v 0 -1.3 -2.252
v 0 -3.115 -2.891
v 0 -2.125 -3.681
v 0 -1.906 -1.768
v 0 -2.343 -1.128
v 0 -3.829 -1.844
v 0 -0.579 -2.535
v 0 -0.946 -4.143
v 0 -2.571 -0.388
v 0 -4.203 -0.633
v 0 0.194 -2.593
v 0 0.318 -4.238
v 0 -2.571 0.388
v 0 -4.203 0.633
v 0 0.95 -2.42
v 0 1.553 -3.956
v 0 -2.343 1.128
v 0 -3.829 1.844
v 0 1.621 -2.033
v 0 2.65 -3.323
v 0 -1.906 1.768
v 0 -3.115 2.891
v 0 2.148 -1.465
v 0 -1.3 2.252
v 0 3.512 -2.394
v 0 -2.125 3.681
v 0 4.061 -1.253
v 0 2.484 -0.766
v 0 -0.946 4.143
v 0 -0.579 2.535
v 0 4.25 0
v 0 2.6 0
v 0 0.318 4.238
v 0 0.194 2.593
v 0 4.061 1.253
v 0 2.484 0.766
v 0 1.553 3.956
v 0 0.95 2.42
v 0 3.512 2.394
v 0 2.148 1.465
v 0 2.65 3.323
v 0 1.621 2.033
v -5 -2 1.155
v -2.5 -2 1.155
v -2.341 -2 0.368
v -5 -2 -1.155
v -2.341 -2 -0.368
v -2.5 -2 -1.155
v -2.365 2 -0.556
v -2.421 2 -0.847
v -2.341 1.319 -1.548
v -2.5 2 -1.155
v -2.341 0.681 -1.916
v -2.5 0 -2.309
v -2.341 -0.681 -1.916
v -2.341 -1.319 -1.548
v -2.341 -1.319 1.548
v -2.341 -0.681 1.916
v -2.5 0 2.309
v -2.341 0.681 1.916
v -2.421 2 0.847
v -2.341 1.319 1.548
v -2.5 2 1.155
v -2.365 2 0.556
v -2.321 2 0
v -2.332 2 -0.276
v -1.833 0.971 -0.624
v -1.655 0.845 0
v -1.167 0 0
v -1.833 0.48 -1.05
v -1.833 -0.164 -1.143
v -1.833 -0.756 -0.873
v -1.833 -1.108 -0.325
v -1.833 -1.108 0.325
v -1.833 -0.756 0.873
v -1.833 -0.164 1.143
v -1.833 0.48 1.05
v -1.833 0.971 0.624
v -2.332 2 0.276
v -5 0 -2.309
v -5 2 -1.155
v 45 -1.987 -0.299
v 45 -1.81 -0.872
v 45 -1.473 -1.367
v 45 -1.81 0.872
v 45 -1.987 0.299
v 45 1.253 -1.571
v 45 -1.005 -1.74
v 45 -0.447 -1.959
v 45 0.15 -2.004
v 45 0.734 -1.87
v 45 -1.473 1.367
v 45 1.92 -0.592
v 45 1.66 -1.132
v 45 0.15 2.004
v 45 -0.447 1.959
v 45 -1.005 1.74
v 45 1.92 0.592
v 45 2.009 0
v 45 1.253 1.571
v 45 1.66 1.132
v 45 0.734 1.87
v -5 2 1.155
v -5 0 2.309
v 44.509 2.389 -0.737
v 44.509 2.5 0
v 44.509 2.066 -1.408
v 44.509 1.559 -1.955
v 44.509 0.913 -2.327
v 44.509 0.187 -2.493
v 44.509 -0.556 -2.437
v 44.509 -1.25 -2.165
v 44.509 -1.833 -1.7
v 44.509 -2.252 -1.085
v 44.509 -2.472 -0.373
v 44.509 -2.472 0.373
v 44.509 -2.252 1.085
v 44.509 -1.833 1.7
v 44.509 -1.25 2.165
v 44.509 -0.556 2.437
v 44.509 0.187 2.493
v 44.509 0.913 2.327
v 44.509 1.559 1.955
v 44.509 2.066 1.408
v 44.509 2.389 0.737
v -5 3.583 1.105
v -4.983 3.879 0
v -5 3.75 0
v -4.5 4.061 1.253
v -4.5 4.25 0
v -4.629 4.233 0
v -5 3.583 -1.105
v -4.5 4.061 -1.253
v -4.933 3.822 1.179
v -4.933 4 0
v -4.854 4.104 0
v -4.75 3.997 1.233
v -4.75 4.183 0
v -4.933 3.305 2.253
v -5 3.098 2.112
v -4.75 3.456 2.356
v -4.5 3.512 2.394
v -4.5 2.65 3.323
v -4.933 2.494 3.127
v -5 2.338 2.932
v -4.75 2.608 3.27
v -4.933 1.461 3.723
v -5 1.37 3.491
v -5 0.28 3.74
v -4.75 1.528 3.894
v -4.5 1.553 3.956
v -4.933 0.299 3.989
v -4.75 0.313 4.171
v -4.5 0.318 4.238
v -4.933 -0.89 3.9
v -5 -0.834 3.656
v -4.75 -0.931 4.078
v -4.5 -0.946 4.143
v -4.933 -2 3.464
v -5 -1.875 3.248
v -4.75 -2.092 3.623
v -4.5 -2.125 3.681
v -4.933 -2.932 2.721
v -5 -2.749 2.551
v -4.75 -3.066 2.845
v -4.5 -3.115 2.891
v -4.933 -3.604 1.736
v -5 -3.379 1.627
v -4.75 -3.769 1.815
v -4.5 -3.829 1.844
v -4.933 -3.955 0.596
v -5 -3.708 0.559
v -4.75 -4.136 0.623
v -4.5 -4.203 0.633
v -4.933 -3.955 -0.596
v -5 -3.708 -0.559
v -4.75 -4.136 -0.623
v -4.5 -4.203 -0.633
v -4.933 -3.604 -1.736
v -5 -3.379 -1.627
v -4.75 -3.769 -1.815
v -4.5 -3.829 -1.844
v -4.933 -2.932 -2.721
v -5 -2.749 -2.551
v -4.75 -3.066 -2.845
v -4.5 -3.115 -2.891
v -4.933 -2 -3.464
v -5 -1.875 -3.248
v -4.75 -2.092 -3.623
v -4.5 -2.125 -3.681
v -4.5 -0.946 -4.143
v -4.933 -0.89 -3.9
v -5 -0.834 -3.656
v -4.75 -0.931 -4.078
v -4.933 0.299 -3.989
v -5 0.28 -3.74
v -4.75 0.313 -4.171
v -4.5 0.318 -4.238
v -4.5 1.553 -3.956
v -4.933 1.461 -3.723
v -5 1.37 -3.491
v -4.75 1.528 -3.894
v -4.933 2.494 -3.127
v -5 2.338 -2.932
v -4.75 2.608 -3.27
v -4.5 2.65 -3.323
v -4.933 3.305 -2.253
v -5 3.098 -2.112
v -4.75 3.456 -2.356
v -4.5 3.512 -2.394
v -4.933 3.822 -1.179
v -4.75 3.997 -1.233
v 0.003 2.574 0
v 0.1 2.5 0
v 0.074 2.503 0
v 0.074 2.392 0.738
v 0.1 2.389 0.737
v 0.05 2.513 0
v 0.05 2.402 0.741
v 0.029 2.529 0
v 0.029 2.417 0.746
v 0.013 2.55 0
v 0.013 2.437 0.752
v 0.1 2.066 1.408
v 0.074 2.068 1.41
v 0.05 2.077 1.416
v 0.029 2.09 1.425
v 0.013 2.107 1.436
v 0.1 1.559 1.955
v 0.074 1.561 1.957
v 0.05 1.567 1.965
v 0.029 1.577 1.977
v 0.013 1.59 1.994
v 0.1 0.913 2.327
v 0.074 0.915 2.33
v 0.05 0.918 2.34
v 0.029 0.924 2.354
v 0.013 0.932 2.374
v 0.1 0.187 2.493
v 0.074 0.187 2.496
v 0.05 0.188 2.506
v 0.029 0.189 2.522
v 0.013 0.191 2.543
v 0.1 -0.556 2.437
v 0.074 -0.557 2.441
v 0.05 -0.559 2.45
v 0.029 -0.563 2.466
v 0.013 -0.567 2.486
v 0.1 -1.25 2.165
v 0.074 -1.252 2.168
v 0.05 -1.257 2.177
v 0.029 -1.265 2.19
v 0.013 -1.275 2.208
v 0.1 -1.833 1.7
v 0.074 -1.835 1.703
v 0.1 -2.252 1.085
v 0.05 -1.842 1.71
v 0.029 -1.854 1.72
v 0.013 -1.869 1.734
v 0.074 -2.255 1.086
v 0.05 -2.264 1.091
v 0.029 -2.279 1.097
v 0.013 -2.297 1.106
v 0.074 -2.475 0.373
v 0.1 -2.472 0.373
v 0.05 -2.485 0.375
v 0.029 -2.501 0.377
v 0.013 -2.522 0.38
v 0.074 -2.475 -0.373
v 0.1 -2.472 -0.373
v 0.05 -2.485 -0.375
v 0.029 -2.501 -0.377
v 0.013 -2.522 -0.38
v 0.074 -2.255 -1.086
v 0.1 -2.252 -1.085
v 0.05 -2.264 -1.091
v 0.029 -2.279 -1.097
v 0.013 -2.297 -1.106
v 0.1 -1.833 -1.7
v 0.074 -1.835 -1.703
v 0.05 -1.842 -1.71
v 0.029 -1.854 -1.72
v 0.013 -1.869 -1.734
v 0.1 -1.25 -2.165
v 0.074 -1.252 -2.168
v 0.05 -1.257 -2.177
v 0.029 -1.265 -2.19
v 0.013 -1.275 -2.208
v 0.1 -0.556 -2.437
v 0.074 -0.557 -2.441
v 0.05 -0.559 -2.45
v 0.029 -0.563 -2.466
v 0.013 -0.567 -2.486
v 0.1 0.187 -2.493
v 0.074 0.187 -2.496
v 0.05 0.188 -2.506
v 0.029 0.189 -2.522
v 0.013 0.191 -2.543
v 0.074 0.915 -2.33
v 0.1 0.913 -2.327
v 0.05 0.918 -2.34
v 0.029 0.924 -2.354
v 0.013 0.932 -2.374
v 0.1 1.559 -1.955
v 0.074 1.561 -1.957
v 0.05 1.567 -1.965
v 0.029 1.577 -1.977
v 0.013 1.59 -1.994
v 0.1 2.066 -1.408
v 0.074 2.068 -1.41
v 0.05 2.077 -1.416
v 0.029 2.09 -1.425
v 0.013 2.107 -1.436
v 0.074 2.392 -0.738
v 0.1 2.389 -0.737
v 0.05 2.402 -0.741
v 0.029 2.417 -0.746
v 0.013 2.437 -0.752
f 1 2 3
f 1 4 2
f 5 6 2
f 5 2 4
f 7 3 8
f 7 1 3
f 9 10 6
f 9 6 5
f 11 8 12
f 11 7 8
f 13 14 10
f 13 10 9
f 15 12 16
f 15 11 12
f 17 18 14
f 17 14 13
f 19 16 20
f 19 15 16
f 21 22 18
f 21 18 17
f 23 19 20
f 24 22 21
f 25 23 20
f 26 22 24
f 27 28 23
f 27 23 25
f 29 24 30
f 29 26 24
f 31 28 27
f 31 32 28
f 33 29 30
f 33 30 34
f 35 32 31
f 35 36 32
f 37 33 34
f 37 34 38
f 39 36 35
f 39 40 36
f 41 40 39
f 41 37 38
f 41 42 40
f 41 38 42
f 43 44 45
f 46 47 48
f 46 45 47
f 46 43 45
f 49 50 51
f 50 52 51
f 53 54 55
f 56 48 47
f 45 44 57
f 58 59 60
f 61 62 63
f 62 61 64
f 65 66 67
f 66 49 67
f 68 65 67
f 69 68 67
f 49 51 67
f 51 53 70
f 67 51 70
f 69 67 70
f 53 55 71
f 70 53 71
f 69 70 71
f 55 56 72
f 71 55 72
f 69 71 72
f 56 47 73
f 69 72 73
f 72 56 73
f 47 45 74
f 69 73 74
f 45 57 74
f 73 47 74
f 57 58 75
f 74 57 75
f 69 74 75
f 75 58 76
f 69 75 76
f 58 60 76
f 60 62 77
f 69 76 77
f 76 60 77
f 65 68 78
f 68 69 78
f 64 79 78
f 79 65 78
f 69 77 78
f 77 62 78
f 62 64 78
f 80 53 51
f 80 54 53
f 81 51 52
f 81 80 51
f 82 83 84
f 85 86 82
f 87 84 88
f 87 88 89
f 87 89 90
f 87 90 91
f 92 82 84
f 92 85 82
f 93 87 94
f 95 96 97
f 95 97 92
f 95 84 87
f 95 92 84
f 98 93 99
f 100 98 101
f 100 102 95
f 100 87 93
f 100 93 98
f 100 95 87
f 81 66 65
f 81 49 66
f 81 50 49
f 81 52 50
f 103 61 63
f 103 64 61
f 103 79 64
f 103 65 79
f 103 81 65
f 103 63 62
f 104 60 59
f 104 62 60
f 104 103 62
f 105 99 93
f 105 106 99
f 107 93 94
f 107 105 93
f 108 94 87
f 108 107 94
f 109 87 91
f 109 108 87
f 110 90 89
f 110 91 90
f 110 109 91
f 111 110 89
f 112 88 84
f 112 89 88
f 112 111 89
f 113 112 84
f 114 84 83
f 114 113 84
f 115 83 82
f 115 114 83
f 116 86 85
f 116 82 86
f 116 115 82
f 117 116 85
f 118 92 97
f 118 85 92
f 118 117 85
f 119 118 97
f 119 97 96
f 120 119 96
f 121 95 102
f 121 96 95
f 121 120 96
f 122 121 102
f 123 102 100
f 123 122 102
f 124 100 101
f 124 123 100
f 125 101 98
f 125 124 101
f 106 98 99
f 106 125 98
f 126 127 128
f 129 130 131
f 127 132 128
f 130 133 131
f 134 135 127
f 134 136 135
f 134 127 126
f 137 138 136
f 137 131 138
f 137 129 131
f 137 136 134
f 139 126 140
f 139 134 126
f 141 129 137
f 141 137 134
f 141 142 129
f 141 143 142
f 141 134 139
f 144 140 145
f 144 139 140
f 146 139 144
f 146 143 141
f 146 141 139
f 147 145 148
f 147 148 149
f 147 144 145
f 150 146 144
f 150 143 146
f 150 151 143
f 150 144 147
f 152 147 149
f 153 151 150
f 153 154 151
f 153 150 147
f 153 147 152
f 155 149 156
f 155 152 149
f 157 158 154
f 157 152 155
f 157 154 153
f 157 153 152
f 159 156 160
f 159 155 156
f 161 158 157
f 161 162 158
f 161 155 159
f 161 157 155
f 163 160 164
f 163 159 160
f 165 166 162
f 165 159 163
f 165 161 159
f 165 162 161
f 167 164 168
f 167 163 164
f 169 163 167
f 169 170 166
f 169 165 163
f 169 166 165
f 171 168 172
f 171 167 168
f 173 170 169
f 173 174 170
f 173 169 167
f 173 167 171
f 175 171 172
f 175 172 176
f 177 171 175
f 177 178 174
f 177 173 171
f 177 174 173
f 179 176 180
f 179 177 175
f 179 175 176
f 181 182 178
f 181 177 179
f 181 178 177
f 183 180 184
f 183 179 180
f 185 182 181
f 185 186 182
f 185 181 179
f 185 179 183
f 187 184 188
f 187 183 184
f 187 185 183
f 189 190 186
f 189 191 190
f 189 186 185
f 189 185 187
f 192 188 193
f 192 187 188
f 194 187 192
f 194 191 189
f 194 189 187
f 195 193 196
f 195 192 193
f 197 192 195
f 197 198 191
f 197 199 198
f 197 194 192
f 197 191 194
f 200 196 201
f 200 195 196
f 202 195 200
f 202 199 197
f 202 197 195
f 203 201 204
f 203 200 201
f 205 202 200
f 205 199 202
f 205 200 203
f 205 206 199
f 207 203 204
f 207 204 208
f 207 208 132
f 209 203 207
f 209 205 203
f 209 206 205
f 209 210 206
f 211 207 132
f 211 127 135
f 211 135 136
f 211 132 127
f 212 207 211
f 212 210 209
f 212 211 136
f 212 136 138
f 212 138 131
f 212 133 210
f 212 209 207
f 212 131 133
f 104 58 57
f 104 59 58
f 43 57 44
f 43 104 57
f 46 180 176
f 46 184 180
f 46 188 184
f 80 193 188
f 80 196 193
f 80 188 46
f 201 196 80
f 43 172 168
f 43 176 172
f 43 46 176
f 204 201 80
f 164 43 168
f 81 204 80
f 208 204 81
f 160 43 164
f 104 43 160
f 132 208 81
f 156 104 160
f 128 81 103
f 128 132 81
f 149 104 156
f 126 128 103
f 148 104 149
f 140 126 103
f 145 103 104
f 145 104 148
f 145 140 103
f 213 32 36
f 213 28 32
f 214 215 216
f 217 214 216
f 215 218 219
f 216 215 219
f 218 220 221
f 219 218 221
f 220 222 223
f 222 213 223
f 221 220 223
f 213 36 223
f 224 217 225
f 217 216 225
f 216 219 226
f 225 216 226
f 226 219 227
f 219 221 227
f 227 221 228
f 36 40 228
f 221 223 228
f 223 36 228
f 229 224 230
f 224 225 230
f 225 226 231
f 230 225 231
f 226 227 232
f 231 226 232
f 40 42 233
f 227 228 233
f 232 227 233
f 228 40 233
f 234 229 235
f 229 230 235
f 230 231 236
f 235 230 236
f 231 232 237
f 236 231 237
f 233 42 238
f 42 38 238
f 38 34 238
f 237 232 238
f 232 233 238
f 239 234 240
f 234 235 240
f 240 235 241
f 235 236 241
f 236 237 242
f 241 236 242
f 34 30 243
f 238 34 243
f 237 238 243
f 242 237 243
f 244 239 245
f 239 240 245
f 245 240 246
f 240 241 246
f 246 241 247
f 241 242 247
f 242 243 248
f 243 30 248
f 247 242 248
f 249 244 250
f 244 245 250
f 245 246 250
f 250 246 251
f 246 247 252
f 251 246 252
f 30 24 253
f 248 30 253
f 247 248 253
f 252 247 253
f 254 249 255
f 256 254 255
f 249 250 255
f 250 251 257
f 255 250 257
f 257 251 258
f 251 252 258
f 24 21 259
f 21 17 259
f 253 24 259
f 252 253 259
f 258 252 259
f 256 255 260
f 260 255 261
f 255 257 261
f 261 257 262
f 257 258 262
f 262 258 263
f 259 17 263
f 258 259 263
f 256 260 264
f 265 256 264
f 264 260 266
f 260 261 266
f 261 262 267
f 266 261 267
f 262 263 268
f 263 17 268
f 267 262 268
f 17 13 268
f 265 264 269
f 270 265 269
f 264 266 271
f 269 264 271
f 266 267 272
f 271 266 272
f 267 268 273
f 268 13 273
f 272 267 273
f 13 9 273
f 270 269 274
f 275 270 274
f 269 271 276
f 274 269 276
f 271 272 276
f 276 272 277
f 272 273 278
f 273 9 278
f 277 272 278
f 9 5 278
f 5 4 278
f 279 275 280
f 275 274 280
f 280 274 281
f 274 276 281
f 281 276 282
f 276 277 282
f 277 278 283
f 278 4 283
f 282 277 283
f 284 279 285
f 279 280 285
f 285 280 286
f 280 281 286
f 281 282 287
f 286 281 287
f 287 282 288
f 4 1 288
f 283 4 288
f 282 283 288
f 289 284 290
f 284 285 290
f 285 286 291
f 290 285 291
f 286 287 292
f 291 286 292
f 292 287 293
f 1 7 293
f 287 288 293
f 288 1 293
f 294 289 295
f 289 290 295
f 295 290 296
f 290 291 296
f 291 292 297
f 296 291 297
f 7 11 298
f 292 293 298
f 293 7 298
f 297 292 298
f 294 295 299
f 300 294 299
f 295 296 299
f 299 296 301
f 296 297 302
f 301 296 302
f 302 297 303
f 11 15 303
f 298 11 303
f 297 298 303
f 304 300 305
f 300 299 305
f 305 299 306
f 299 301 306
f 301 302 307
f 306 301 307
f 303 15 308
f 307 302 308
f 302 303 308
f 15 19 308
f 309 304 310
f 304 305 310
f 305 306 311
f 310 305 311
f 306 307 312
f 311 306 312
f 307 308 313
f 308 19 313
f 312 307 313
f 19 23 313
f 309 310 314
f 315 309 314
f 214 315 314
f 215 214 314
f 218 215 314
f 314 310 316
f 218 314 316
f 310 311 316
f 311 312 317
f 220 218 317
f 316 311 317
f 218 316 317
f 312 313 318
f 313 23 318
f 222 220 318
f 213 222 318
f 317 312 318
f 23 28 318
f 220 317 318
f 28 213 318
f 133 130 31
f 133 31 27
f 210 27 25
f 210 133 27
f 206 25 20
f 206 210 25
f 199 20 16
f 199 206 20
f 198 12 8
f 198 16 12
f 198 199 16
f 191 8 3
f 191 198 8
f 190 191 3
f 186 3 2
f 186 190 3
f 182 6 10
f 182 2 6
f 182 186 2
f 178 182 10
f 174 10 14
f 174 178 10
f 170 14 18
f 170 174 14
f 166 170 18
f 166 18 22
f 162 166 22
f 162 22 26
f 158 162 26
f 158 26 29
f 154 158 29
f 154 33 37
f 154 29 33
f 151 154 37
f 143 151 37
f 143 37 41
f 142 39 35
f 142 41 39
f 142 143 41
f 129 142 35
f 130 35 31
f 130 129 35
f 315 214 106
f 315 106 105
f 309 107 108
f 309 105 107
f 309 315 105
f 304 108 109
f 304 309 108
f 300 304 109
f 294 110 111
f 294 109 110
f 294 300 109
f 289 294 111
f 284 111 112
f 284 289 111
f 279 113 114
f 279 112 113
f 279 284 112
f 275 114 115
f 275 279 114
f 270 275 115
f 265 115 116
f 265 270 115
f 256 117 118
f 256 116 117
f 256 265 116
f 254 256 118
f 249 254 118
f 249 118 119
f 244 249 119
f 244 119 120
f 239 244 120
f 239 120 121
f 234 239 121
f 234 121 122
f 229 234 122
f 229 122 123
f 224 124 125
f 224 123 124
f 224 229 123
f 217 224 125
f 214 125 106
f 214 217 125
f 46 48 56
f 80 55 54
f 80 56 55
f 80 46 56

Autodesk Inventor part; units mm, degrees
ref_plane "YZ Plane" through (0, 0, 0) normal (1, 0, 0) x (0, 1, 0)
ref_plane "XZ Plane" through (0, 0, 0) normal (0, 1, 0) x (-1, 0, 0)
sketch "Sketch1" plane through (0, 0, 0) normal (0, 0, 1) x (1, 0, 0)
  line L0 (-1.1667, 0) -> (45, 0)
  line L1 (45, 0) -> (45, 2.5)
  line L2 (45, 2.5) -> (23, 2.5)
  line L3 (23, 2.5) -> (22.5091, 2.5)
  line L4 (22.5091, 2.5) -> (0, 2.5)
  line L5 (0, 2.5) -> (0, 4.25)
  line L6 (0, 4.25) -> (-5, 4.25)
  line L7 (-5, 4.25) -> (-5, 2.3094)
  line L8 (-5, 2.3094) -> (-2.5, 2.3094)
  line L9 (-2.5, 2.3094) -> (-1.1667, 0)
  line L10 (-15, 0) -> (55, 0) projected
  line L11 (0, -0.85) -> (0, 5.1) projected
  line L12 (23, 2.5) -> (0, 2.5) construction
  dimension "d1" = 22
  dimension "d2" = 0.4909
  dimension "d3" = 5
  dimension "d4" = 2.5
  dimension "d5" = 60
  dimension "d6" = 5
  dimension "d7" = 5
  dimension "d8" = 4.6188
  dimension "d9" = 8.5
  dimension "d26" = 45
revolve "Body" add sketch "Sketch1" angle 360 about axis through (-1.1667, 0, 0) along (1, 0, 0)
sketch "Sketch2" plane through (-5, 0, 0) normal (-1, 0, 0) x (0, 0, 1)
  circle A0 centre (0, 0) radius 2.3094 projected
  line L0 (0, -5.95) -> (0, 5.95) projected
  line L1 (-5.95, 0) -> (5.95, 0) projected
  line L2 (2.3094, 0) -> (1.1547, -2)
  line L3 (1.1547, -2) -> (-1.1547, -2)
  line L4 (-1.1547, -2) -> (-2.3094, 0)
  line L5 (-2.3094, 0) -> (-1.1547, 2)
  line L6 (-1.1547, 2) -> (1.1547, 2)
  line L7 (1.1547, 2) -> (2.3094, 0)
extrude "Slot" add sketch "Sketch2" against normal up to next contours L7 A0 | A0 L2 | L6 L0 A0 | A0 L0 L3 | L0 L6 A0 | A0 L3 L0 | L4 A0 | A0 L5
fillet "Fillet1" radius 0.5 1 edges at (-5, -4.25, 0)
thread "Thread" size "M5x0.8" designation "M5" class "6g" standard "ISO Metric profile" length 22
chamfer "Chamfer1" distance 0.4908 distance2 0.4908 1 edges at (45, -2.5, 0) measured on face at (45, 0.4734, 0.6858)
ref_plane "Work Plane1" through (29, 0, 0) normal (0, -1, 0) x (1, 0, 0)
fillet "Fillet2" radius 0.1 1 edges at (0, -2.5, 0)
equation "\"d1\" = GEL"
equation "\"d3\" = KOH"
equation "\"d4\" = INTI"
equation "\"d6\" = GD"
equation "\"d7\" = BDM"
equation "\"d8\" = 1.1547 * SW"
equation "\"d9\" = KOD"
equation "\"d26\" = NLG"
equation "\"d30\" = R"
equation "\"d17\" = RR"
equation "\"d13\" = GEL"
equation "\"d15\" = -0.5 * SPD + 0.5 * GD"
equation "\"d16\" = GUL"
equation "\"GD\" = 5"
equation "\"NLG\" = 45"
equation "\"GEL\" = 22"
equation "\"KOD\" = 8.5"
equation "\"KOH\" = 5"
equation "\"INTI\" = 2.5"
equation "\"GAL\" = 0.61345 * PTC"
equation "\"GUL\" = 0.61345 * PTC"
equation "\"BDM\" = NND"
equation "\"SW\" = 4"
equation "\"RR\" = 0.5"
equation "\"SPD\" = NND - 1.2269 * PTC"
equation "\"R\" = 0.1"
equation "\"TOA\" = 30deg"
equation "\"GD1\" = THREADDIA - 1.2269 * PTC"
equation "\"THREADDIA\" = 5"
equation "\"FAWI\" = 45deg"
equation "\"PTC\" = 0.8"
equation "\"NND\" = 5"
equation "\"E0\" = 1.155 * SW"
properties part number "ISO 4762 - M5 x 45" material "Steel"
